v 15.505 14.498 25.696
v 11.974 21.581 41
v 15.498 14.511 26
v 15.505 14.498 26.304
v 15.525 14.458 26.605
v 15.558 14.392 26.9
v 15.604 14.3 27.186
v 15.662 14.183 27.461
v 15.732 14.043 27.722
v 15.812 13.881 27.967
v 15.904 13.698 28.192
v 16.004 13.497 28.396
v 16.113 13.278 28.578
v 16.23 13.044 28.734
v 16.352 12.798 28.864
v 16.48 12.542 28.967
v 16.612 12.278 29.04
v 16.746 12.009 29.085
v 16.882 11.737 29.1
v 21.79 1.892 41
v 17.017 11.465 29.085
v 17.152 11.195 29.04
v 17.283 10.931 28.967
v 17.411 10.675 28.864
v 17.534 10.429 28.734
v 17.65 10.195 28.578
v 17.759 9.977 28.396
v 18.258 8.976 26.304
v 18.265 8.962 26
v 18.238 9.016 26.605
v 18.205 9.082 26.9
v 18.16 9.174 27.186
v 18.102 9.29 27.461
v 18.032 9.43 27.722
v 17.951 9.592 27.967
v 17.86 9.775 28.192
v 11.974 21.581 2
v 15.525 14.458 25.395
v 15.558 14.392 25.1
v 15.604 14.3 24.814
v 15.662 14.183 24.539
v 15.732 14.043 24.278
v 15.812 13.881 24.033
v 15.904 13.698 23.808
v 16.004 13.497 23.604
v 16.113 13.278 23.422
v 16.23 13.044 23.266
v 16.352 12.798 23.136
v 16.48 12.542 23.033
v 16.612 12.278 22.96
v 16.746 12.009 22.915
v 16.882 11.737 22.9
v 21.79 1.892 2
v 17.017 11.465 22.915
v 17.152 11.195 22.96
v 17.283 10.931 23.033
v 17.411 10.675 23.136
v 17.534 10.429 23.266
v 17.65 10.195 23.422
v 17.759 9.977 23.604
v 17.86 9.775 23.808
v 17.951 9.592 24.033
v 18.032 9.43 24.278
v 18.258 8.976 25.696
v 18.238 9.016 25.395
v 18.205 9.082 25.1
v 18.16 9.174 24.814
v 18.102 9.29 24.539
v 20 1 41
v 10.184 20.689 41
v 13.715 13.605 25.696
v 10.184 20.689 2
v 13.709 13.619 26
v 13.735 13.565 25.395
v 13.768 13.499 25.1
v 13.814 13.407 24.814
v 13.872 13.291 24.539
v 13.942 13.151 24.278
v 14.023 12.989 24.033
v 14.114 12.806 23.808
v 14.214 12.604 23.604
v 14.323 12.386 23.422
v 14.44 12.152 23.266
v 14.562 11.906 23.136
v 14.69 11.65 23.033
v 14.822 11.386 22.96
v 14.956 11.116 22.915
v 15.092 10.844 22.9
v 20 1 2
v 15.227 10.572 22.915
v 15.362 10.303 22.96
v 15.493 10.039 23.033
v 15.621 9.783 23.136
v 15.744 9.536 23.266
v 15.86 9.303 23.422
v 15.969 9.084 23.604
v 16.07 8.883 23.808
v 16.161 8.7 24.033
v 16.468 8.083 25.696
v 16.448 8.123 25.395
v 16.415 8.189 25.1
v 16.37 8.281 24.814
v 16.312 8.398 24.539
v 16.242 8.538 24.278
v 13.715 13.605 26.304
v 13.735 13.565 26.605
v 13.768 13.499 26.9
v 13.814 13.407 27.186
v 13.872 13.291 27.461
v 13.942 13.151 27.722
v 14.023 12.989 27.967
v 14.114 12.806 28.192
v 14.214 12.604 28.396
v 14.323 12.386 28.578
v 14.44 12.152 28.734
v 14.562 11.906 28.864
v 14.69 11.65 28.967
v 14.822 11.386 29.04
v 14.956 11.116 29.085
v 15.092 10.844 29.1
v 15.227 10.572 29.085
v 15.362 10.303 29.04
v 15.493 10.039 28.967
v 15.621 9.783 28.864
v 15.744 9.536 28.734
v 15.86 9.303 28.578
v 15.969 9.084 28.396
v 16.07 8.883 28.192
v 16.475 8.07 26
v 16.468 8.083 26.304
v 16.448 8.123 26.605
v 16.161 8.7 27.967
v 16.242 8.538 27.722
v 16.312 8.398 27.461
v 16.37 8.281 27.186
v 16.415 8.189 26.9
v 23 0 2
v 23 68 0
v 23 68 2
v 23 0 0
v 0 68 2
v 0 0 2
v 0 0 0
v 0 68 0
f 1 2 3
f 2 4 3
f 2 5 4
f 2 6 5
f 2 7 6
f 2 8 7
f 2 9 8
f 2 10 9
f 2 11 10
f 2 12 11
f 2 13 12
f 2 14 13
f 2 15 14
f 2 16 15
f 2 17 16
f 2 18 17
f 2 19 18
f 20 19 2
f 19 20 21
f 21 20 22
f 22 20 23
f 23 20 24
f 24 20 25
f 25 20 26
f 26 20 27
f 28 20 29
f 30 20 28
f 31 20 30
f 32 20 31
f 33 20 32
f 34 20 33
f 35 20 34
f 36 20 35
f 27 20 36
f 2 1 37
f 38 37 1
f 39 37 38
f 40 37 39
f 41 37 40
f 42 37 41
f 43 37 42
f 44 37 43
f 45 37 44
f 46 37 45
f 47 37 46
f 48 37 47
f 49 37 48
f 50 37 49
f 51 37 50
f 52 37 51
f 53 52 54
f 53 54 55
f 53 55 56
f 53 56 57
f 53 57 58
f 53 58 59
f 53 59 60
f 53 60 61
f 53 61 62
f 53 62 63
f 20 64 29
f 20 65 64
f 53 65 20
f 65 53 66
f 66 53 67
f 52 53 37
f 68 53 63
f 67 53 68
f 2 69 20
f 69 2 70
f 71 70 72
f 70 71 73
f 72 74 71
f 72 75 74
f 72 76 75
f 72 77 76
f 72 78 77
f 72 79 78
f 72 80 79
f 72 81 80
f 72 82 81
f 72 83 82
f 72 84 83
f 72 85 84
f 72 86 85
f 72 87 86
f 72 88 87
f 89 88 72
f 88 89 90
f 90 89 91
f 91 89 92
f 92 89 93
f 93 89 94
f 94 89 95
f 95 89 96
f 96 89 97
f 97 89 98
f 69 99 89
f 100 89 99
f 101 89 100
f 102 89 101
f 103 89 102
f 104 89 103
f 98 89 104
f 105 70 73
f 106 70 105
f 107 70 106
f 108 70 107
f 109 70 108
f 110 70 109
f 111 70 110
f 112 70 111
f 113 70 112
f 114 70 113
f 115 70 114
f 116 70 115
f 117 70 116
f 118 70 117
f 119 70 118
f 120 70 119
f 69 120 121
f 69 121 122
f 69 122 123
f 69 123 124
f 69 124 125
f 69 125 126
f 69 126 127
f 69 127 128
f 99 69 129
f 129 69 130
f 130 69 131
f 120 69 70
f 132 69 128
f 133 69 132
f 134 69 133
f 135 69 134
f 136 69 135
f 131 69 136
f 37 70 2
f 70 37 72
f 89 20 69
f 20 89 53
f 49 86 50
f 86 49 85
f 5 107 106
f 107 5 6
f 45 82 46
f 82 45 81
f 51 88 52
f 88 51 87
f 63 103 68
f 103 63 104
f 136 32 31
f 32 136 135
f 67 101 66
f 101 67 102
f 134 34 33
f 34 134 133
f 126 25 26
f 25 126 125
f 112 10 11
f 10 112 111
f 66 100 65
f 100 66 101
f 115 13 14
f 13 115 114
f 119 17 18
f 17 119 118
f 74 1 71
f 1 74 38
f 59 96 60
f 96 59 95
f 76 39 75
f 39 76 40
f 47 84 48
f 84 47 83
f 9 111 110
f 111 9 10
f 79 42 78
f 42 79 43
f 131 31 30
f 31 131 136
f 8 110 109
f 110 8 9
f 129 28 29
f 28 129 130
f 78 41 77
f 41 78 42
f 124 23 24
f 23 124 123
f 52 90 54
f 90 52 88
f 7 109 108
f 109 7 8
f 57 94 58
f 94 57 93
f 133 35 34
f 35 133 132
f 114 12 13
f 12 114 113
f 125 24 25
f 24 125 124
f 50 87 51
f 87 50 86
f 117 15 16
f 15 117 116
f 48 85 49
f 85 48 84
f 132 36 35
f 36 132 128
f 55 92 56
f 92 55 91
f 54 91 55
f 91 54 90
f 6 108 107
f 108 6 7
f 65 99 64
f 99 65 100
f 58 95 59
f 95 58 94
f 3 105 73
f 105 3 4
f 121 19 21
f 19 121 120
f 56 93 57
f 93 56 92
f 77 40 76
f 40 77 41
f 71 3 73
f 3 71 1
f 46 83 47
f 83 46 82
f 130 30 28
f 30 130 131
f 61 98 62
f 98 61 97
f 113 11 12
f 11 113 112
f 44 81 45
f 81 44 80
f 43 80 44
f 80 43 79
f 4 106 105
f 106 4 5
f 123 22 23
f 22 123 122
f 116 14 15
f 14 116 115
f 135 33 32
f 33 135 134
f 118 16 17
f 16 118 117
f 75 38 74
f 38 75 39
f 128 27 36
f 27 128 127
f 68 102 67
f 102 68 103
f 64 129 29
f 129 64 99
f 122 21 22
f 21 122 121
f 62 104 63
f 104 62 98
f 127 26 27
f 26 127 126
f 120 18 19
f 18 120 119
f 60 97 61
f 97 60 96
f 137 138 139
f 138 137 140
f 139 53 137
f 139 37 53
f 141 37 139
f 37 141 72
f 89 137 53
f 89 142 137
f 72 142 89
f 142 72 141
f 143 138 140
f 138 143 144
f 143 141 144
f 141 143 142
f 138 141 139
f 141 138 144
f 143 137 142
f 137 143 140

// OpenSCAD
$fn=64;
union () {
    
color("green")
cube([23,68,2],center=false);

translate([20.0,1,1])
rotate([0,0,90-63.5])
difference() {
color("red")
cube([2,22,40]);

color("blue")
rotate([0,90,0])
translate([-25,11,-1])
cylinder(h=5,r=3.1);
}
}
